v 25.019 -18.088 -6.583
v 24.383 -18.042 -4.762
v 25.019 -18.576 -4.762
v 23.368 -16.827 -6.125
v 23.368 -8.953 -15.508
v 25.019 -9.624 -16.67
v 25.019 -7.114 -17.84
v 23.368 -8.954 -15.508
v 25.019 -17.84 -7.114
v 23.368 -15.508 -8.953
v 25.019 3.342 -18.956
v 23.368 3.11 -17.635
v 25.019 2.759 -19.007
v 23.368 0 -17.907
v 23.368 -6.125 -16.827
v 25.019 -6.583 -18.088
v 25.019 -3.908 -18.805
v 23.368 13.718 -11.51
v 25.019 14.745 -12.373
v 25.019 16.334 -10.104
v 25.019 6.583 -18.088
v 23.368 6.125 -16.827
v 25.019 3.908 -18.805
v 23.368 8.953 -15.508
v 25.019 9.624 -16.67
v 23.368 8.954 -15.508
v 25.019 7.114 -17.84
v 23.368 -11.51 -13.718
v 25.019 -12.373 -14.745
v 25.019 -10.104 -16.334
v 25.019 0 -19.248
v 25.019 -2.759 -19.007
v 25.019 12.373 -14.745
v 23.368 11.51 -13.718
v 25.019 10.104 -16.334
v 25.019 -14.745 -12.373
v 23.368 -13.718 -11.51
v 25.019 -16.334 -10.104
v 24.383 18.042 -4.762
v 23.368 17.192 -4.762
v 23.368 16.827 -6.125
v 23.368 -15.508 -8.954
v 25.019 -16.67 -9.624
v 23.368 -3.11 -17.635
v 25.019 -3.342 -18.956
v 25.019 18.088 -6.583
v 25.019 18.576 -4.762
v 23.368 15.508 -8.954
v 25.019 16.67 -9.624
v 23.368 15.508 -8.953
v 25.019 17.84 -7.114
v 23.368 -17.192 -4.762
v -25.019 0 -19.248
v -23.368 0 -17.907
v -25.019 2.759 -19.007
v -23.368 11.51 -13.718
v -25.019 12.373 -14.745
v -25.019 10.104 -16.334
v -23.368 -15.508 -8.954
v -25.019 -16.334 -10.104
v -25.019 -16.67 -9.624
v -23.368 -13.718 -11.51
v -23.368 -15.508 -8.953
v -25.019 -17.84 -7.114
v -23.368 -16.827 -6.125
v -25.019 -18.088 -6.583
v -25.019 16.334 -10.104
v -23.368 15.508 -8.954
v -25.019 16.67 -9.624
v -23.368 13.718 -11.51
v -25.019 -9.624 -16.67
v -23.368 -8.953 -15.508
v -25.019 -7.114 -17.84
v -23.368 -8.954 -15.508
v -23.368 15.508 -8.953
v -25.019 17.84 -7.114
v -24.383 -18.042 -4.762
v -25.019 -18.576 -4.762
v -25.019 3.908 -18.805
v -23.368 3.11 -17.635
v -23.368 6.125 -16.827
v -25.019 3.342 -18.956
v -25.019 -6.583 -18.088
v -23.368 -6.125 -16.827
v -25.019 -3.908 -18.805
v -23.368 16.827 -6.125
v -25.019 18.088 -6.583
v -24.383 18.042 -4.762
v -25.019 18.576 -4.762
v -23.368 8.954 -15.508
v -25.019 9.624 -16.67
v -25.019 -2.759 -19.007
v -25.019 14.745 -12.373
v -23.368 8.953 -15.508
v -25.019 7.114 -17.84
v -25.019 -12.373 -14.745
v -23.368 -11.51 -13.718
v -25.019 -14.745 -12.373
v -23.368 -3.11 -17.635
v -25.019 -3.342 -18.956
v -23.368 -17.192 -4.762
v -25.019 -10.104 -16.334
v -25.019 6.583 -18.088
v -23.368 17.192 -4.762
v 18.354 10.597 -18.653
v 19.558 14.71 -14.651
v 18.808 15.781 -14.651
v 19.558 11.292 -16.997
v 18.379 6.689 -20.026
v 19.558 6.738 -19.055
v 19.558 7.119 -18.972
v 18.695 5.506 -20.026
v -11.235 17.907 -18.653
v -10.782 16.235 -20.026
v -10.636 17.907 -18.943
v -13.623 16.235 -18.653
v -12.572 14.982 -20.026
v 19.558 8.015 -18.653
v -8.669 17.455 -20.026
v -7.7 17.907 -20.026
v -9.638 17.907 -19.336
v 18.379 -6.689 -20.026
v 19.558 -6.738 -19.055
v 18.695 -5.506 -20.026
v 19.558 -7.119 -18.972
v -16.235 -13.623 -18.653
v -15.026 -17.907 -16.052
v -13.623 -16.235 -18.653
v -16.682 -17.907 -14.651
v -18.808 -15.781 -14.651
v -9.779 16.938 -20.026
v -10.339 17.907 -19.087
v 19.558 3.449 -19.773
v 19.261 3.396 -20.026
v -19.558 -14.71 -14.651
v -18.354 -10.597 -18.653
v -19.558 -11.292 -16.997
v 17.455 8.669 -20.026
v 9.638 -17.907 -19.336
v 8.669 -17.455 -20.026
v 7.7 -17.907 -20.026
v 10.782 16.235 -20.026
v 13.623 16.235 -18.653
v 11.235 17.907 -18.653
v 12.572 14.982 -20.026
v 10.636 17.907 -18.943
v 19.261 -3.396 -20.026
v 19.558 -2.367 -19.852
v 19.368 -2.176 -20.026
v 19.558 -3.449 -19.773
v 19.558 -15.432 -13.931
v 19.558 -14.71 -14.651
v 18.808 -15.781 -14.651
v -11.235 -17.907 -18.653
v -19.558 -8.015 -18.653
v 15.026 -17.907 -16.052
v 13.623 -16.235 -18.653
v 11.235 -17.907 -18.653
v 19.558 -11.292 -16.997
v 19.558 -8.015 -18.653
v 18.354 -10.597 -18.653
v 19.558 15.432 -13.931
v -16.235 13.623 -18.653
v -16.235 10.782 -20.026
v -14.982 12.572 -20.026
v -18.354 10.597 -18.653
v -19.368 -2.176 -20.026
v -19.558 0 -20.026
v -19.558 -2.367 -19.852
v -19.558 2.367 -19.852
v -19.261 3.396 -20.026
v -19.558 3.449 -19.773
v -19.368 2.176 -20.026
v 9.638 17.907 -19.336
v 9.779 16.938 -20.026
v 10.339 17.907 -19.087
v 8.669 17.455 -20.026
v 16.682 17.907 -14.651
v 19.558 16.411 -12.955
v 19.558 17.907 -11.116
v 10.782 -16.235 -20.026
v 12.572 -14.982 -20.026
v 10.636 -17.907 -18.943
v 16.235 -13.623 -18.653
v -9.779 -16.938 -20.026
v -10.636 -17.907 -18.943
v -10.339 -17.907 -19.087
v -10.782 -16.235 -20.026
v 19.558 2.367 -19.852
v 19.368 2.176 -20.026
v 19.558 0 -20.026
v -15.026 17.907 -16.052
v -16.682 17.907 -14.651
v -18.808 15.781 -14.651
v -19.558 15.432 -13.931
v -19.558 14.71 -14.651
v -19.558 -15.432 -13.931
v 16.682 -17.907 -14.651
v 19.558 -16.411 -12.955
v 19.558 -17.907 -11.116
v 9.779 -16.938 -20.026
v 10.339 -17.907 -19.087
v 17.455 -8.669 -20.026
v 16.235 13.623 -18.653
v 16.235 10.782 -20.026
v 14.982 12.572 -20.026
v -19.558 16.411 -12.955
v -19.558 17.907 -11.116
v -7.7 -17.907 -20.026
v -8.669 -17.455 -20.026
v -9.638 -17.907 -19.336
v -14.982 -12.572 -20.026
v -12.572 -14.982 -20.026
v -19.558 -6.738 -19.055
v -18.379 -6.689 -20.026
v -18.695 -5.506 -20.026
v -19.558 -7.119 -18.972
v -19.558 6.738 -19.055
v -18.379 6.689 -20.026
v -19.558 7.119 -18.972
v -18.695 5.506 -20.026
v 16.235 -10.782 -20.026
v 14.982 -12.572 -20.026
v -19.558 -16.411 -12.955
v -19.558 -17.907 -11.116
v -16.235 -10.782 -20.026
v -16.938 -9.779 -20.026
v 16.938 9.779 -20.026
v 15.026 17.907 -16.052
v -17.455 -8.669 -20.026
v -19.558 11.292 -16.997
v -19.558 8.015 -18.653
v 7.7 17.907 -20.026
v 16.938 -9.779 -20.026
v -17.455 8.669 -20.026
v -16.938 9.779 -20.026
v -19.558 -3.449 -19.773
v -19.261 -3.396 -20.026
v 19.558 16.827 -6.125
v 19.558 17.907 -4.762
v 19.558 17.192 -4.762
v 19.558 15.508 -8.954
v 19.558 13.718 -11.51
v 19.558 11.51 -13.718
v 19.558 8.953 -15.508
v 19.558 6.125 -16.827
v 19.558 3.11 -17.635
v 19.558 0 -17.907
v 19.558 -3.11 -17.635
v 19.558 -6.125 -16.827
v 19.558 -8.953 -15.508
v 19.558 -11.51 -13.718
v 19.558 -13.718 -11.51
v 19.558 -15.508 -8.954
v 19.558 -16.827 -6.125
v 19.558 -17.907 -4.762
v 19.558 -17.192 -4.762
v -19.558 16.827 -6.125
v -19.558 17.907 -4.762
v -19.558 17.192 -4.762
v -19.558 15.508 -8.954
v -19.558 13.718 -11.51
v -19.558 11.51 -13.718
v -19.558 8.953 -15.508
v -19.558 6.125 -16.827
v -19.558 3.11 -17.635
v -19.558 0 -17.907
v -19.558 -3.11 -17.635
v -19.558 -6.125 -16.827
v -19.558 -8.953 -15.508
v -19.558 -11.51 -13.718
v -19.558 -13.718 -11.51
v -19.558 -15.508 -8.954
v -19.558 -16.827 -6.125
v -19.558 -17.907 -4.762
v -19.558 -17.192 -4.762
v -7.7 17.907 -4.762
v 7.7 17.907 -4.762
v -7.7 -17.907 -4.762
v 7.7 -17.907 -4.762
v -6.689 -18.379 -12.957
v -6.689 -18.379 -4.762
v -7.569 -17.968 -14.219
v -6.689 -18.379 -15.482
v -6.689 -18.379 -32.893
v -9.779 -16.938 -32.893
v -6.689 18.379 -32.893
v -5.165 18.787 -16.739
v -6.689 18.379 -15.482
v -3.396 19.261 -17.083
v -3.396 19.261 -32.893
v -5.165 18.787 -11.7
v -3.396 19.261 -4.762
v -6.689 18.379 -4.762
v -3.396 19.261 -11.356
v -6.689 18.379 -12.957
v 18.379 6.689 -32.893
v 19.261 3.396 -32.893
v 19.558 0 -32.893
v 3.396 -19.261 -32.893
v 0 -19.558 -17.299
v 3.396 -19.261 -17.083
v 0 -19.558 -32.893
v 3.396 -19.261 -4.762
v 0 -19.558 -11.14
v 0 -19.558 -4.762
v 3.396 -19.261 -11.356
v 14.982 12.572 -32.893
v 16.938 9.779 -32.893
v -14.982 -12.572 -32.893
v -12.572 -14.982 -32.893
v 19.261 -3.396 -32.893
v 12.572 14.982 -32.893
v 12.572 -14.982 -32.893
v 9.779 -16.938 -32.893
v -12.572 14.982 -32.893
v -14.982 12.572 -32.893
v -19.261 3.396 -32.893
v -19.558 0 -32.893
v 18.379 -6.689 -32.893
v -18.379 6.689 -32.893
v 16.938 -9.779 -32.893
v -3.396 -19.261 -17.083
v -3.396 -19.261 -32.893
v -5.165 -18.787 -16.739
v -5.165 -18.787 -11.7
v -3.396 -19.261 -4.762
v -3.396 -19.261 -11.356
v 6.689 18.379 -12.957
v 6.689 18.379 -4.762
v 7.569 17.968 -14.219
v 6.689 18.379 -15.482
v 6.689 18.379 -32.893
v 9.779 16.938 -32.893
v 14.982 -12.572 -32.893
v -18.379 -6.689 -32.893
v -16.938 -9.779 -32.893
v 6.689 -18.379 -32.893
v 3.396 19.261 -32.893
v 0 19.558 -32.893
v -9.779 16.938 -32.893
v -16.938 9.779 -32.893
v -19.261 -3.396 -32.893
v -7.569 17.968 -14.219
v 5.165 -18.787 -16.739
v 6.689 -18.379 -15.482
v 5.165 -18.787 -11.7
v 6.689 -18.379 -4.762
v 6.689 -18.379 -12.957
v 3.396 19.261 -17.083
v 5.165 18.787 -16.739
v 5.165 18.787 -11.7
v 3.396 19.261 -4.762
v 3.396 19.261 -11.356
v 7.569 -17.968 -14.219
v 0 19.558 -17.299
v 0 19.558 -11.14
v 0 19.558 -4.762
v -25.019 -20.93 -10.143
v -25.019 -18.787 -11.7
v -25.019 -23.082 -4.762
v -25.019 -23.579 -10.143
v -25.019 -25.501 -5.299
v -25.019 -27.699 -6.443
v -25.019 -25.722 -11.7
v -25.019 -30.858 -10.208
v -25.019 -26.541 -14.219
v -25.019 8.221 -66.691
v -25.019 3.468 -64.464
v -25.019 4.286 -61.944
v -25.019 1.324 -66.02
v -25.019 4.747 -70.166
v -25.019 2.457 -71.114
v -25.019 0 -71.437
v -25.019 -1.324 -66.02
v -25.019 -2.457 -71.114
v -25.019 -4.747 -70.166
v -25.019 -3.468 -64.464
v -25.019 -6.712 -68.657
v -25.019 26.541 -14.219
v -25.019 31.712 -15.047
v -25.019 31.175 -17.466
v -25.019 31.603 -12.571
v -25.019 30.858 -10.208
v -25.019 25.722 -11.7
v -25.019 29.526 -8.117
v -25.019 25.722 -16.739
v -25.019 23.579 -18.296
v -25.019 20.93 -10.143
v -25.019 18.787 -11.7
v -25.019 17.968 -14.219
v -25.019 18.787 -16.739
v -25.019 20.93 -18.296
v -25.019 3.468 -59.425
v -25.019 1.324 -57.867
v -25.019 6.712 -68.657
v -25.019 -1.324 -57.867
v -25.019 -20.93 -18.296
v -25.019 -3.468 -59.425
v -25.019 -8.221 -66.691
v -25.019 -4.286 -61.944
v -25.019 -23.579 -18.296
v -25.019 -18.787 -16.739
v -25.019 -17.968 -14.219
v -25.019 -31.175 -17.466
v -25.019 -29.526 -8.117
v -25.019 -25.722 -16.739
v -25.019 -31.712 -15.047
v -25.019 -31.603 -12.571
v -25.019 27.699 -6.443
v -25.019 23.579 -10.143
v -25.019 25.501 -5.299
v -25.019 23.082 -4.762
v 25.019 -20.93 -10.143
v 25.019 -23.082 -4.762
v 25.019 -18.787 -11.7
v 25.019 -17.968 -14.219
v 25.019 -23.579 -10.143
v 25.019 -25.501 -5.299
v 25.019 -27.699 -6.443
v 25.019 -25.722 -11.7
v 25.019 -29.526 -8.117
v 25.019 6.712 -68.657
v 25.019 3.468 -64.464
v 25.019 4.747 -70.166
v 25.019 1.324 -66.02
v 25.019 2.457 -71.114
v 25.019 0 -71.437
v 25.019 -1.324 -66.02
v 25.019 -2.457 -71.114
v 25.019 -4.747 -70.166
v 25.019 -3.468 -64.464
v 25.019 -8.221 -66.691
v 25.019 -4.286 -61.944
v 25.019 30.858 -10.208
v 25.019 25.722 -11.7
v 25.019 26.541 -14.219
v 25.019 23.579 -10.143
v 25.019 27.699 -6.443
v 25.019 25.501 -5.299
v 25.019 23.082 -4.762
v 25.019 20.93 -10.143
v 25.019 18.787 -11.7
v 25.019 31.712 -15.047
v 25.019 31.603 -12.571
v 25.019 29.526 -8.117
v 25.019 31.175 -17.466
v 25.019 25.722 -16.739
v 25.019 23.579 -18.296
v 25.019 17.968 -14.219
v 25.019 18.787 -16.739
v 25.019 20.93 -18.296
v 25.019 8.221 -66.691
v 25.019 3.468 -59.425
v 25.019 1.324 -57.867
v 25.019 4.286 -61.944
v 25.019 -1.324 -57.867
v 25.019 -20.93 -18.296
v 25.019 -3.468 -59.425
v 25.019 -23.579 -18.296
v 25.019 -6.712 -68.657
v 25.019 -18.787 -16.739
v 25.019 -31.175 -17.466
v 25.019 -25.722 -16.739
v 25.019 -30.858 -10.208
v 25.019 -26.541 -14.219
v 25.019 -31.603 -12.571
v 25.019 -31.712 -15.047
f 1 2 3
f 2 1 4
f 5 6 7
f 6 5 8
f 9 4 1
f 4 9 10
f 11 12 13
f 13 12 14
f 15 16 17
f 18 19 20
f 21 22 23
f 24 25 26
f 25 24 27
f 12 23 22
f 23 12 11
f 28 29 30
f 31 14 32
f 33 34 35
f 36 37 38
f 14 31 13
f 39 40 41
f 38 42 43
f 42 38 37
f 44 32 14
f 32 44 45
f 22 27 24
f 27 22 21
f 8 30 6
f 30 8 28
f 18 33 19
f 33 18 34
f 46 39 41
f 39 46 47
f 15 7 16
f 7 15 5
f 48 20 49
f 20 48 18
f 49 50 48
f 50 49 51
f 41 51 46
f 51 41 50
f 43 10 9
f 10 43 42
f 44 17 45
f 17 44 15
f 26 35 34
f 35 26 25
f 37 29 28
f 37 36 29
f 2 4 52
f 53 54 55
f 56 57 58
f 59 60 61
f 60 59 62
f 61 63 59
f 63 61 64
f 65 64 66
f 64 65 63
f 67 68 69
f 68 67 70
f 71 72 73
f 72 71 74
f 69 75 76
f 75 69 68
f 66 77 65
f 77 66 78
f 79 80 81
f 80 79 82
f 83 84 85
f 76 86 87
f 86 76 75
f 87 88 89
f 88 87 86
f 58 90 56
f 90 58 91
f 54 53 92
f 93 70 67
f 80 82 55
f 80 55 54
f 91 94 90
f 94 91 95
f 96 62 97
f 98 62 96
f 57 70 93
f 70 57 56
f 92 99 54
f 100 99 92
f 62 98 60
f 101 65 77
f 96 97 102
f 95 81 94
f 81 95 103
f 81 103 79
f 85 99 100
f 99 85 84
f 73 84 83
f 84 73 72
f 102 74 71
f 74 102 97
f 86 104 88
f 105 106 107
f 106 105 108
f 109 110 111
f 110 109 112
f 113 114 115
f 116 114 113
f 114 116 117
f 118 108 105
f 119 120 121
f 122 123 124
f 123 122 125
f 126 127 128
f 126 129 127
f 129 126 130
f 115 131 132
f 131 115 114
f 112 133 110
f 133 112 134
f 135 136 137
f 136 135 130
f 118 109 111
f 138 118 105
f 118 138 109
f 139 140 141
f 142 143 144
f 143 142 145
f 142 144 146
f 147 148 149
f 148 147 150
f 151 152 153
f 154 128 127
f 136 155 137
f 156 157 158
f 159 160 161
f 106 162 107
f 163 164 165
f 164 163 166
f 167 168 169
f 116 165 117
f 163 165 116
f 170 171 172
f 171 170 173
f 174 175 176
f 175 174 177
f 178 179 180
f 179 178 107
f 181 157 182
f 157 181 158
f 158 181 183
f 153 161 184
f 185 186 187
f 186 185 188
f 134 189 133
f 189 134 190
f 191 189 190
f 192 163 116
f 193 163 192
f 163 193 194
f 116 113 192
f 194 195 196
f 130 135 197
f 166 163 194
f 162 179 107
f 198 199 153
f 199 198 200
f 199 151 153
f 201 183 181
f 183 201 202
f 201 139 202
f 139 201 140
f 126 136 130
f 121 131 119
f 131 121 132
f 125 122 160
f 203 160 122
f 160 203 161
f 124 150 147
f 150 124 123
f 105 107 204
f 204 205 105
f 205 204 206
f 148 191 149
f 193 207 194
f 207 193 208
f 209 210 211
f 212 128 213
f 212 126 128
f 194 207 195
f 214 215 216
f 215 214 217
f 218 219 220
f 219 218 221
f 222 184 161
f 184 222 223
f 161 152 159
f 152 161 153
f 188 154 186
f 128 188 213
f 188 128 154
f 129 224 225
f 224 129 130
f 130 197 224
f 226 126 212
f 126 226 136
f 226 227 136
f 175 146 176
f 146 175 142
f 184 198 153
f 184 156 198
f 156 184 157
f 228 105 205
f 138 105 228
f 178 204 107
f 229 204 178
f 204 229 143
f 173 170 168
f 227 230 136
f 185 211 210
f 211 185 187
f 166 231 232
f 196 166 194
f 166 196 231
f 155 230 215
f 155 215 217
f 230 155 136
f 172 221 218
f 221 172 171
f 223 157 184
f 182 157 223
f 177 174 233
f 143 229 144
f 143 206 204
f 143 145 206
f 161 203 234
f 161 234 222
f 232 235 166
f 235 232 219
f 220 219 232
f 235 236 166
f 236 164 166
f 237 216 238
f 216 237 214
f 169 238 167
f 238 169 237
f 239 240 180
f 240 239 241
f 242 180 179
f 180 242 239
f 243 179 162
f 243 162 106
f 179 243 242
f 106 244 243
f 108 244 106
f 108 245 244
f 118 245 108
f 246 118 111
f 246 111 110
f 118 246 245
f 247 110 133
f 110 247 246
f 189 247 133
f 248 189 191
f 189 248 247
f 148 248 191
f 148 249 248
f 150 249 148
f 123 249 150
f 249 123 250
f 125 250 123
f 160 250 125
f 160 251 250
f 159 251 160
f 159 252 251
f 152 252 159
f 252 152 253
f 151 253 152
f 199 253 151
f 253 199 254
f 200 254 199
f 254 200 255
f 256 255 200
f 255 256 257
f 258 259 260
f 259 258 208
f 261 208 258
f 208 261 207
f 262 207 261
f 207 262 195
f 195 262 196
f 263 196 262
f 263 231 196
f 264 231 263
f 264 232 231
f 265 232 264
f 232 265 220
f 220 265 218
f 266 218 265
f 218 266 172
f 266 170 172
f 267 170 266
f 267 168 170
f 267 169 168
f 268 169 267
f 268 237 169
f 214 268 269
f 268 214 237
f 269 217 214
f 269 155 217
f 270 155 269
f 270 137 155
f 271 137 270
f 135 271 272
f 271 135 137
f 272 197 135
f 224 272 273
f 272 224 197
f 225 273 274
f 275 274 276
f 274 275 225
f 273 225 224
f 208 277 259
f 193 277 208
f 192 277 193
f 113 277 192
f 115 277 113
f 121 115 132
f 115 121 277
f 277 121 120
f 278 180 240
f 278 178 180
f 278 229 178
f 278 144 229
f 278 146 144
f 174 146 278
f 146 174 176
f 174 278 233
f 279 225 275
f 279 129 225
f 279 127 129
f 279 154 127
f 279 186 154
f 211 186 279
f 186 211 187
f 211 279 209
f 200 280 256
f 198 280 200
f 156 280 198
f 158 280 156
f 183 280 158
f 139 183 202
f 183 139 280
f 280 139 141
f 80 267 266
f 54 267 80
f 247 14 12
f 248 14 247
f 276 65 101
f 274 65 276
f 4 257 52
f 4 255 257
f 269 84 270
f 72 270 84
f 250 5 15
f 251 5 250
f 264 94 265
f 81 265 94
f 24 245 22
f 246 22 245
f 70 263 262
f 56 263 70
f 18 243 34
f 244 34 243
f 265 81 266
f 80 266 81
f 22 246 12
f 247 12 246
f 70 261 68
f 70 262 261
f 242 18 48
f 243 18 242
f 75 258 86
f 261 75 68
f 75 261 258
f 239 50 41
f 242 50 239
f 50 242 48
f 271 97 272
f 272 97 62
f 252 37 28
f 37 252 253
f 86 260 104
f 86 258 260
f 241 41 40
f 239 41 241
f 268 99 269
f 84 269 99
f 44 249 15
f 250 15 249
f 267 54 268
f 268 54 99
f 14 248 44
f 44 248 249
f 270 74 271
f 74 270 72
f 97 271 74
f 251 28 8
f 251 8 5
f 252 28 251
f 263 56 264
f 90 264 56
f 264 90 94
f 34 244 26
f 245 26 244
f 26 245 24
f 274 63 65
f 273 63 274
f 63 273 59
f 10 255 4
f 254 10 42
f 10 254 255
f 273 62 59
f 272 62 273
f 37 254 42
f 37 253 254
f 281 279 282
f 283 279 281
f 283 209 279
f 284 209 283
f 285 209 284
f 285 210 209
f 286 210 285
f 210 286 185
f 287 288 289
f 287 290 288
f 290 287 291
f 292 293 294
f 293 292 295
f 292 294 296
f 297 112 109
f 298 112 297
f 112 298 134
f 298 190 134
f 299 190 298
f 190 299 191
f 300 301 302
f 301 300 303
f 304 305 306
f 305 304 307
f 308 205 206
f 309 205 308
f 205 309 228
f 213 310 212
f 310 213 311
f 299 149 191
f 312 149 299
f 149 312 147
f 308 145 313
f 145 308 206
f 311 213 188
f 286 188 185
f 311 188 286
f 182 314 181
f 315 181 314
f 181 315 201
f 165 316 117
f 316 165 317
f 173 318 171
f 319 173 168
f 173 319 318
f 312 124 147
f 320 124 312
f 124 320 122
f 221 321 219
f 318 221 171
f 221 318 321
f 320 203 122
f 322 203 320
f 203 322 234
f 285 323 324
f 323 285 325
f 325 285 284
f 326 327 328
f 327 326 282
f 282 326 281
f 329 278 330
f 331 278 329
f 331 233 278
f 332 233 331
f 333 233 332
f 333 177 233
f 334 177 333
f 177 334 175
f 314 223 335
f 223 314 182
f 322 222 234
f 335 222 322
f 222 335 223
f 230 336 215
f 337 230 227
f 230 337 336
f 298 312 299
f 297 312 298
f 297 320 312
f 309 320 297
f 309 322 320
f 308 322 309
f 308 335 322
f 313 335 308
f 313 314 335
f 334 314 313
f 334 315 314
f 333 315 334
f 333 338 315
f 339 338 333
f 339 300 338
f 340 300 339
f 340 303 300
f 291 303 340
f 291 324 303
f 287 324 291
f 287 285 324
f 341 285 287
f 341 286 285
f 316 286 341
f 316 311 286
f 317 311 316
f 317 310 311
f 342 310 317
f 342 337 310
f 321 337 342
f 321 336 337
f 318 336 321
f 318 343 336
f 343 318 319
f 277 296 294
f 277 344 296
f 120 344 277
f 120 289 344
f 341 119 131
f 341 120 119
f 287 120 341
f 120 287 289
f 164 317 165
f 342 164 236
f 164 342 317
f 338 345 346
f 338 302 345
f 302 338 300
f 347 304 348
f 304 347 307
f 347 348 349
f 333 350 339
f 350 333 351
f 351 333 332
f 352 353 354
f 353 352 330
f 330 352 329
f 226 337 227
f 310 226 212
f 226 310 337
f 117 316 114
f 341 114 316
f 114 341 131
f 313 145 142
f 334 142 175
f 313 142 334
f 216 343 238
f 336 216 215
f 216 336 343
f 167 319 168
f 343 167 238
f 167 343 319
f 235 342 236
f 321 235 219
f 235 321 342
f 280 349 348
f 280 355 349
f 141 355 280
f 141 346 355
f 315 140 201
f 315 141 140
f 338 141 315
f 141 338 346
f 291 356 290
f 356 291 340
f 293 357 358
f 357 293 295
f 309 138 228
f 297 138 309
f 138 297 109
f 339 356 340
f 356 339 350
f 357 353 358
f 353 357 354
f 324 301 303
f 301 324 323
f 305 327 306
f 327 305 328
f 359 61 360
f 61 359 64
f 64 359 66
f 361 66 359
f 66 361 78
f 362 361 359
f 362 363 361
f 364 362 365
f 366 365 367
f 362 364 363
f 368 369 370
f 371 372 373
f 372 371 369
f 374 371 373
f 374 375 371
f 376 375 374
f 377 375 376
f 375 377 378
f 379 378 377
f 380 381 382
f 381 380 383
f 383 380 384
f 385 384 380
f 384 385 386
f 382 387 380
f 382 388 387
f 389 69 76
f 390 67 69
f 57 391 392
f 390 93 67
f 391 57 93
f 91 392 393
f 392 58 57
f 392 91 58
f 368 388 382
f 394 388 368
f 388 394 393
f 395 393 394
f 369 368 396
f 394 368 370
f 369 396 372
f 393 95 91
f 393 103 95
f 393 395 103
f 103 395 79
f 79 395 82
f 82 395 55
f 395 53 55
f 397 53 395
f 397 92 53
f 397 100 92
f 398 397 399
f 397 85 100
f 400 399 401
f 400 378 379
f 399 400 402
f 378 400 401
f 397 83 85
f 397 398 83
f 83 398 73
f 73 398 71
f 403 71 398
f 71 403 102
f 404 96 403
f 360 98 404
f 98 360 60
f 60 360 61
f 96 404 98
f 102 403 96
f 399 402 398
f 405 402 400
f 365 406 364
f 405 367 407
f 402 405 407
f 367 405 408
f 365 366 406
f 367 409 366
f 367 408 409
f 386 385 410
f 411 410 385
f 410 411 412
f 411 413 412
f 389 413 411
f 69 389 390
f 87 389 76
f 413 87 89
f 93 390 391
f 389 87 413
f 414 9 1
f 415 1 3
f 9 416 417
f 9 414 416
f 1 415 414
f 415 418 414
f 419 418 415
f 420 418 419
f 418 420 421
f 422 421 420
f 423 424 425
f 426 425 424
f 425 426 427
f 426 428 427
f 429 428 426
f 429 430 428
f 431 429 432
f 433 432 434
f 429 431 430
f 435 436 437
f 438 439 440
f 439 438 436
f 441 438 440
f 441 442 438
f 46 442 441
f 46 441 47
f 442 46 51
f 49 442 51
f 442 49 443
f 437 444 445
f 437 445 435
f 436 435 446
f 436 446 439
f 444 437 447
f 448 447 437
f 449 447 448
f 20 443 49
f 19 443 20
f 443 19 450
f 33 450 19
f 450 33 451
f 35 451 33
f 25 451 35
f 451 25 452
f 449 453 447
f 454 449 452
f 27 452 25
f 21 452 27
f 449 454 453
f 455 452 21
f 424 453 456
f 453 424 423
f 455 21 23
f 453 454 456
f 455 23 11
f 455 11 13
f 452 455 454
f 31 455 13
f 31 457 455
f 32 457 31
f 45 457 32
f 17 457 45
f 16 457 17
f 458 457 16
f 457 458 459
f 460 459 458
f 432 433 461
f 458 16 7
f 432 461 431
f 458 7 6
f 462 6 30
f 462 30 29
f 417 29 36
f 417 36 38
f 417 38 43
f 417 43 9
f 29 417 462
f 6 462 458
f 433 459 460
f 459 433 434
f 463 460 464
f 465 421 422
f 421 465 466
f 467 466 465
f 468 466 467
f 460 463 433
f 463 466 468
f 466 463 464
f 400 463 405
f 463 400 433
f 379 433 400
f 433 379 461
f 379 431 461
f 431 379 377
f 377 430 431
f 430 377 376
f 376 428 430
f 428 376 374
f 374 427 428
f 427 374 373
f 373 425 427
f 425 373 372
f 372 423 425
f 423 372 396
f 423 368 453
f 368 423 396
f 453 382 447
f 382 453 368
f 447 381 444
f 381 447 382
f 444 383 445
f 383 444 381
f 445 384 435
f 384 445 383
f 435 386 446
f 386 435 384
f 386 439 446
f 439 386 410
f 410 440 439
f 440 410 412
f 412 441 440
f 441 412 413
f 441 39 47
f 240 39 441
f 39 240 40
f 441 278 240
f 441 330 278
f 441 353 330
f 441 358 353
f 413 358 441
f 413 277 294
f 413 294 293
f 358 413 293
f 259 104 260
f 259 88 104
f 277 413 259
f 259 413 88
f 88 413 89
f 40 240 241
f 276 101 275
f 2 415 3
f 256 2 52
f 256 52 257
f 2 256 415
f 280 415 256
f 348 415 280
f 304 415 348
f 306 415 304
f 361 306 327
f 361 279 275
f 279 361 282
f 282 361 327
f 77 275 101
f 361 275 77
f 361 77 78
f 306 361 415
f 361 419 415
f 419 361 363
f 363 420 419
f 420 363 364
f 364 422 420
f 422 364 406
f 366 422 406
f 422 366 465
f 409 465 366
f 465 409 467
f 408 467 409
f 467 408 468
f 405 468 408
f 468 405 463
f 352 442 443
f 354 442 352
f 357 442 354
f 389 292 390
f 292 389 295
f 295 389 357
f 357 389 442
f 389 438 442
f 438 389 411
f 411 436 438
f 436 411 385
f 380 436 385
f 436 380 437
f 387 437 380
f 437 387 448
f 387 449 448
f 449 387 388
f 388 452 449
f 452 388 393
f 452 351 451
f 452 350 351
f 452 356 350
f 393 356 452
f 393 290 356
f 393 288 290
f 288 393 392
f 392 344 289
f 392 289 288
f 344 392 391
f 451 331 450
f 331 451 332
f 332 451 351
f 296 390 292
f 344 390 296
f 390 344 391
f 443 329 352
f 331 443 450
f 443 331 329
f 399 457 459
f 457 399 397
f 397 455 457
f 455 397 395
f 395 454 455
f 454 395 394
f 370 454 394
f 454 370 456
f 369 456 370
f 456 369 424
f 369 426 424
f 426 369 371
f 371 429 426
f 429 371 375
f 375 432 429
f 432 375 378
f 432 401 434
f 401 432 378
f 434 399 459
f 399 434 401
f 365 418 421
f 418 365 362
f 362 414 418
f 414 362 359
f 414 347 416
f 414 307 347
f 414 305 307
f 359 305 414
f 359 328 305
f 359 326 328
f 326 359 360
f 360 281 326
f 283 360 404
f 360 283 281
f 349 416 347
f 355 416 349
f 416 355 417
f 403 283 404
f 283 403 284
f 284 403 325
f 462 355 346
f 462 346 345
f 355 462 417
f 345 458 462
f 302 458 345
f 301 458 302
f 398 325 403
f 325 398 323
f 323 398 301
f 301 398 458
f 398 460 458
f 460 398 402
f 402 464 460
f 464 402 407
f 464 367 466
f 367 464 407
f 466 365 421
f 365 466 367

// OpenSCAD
// file: Vitamins/Angle Stock.scad
AngleStockWidth                   = 1;
AngleStockThickness               = 2;
AngleStockTrough                  = 3; // Thickness across the "elbow" of the angle
AngleStockWidthClearanceSnug      = 4;
AngleStockWidthClearanceLoose     = 5;
AngleStockThicknessClearanceSnug  = 6;
AngleStockThicknessClearanceLoose = 7;
AngleStockHeight                  = 8;

// .747
// .744
// .745
//.740


//.749
//.75
AngleStockThreeQuartersByOneEighthInch = [
  [AngleStockWidth,                   0.771],
  [AngleStockThickness,               0.13],
  [AngleStockTrough,                  0.235],
  [AngleStockWidthClearanceSnug,      0.008],
  [AngleStockWidthClearanceLoose,     0.015],
  [AngleStockThicknessClearanceSnug,  0.007],
  [AngleStockThicknessClearanceLoose, 0.008],
  [AngleStockHeight,                  0.574]
];

3_4_angle_stock_width                     = 3/4;
3_4_angle_stock_thickness                 = 0.13;
3_4_angle_stock_trough                    = 0.235;
3_4_angle_stock_height                    = 0.574;
3_4_angle_stock_width_clearance           = 0.008;
3_4_angle_stock_width_clearance_loose     = 0.008;
3_4_angle_stock_thickness_clearance       = 0.005;
3_4_angle_stock_thickness_clearance_loose = 0.007;

// trough is a percentage: 0.0-1.0
module AngleStock(stock=AngleStockThreeQuartersByOneEighthInch, trough=.5, thicknessClearance=AngleStockThicknessClearanceLoose, widthClearance=AngleStockWidthClearanceLoose, length=1) {

  // A percentage of the inner-side length (width - thickness)
  clearThicknessOffset = thicknessClearance != undef ? lookup(thicknessClearance, stock) : 0;
  clearWidthOffset     = widthClearance     != undef ? lookup(widthClearance, stock)     : 0;
  troughOffset         = (trough * (lookup(AngleStockWidth, stock) - lookup(AngleStockThickness, stock))) + lookup(AngleStockThickness, stock);

  linear_extrude(height=length)
  polygon(points=[[0,0],
                  [lookup(AngleStockWidth, stock)+clearWidthOffset,0],                                                         // X-POS Outer Corner
                  [lookup(AngleStockWidth, stock)+clearWidthOffset,lookup(AngleStockThickness, stock)+clearThicknessOffset],   // X-POS Inner Corner
                  [troughOffset,lookup(AngleStockThickness, stock)+clearThicknessOffset],                                      // X-POS Trough
                  [lookup(AngleStockThickness, stock)+clearThicknessOffset,troughOffset],                                      // Y-POS Trough
                  [lookup(AngleStockThickness, stock)+clearThicknessOffset,lookup(AngleStockWidth, stock)+clearWidthOffset],   // Y-POS Inner Corner
                  [0,lookup(AngleStockWidth, stock)+clearWidthOffset],                                                         // Y-POS Outer Corner
          ],
          paths=[[0,1,2,3,4,5,6]]);
}


//#AngleStock();

module 3_4_angle_stock(length=1, cutter=false, loose=false) {
  width_clearance     = loose ? 3_4_angle_stock_width_clearance_loose     : 3_4_angle_stock_width_clearance;
  thickness_clearance = loose ? 3_4_angle_stock_thickness_clearance_loose : 3_4_angle_stock_thickness_clearance;

  union() {
    if (cutter) {
      translate([-width_clearance,-thickness_clearance,0])
      cube([3_4_angle_stock_width     + width_clearance*2,
            3_4_angle_stock_thickness + thickness_clearance*2,
            length]);

      translate([-width_clearance,-thickness_clearance,0])
      cube([3_4_angle_stock_thickness + thickness_clearance*2,
            3_4_angle_stock_width     + width_clearance*2,
            length]);

      translate([3_4_angle_stock_thickness/2, 3_4_angle_stock_thickness/2, 0])
      difference() {
        cube([3_4_angle_stock_trough + thickness_clearance/2,
              3_4_angle_stock_trough + thickness_clearance/2,
              length]);

        translate([3_4_angle_stock_trough + thickness_clearance/2,
                   thickness_clearance/2,
                   -0.1])
        rotate([0,0,45])
        cube([3_4_angle_stock_trough*sqrt(2),
              3_4_angle_stock_trough*sqrt(2),
              length + 0.2]);
      }

    } else {
      cube([3_4_angle_stock_width,3_4_angle_stock_thickness,length]);
      cube([3_4_angle_stock_thickness,3_4_angle_stock_width,length]);

      translate([3_4_angle_stock_thickness, 3_4_angle_stock_thickness, 0])
      difference() {
        cube([3_4_angle_stock_trough, 3_4_angle_stock_trough,length]);

        translate([3_4_angle_stock_trough,0,-0.1])
        rotate([0,0,45])
        cube([3_4_angle_stock_trough*sqrt(2), 3_4_angle_stock_trough*sqrt(2),length + 0.2]);
      }
    }
  };
}
// file: Math/Triangles.scad
// Pythagorean Theorem
function pyth_A_B(a,b) = sqrt(pow(a, 2) + pow(b, 2));
function pyth_A_C(a,c) = sqrt(pow(c, 2) - pow(a, 2));
function pyth_B_C(b,c) = sqrt(pow(c, 2) - pow(b, 2));

// Heron's Formula for Triangle Area
function heron_triangle_area(a,b,c) = sqrt(
    ((a+b+c)/2)
    * (((a+b+c)/2) - a)
    * (((a+b+c)/2) - b)
    * (((a+b+c)/2) - c)
  );

function heron_triangle_height(a,b,c) = 2 * heron_triangle_area(a,b,c) / c;
// file: Firing Pin Guide.scad
include <Components.scad>;
use <Vitamins/Pipe.scad>;
use <Vitamins/Rod.scad>


// Firing Pin Extension
module firing_pin_guide(firingPinRod=RodOneEighthInch,
                        height=7/16, od=TeeInnerDiameter(receiverTee),
                        $fn=50) {
  color("Orange")
  render()
  difference() {
    union() {
      cylinder(r=od/2, h=height);
    }

    // Tapered Entrance
    translate([0,0,height/3*2])
    cylinder(r1=lookup(RodRadius, RodOneEighthInch), r2=1/4, h=height/3);

    // Firing Pin Hole
    translate([0,0,-0.1])
    Rod(rod=firingPinRod, clearance=RodClearanceLoose, length=height+0.2, $fn=50);
  }
}


scale([25.4, 25.4, 25.4])
firing_pin_guide();
// file: Striker.scad
use <Vitamins/Pipe.scad>;
use <Vitamins/Rod.scad>;

module striker(length=4, od=0.75, id=0.53,
               firingPin = Spec_RodOneEighthInch(),
               linePin = Spec_RodOneEighthInch(),
               depth=0.8,
               rope_width = 1/8, rope_depth=1/4, $fn=30) {

  difference() {

    // Body
    cylinder(r=od/2, h=length);

    // Weight Hole
    translate([0,0,depth])
    cylinder(r=id/2, h=length);

    // Line Pin Hole
    translate([0,od/2 + 0.1,length - RodDiameter(firingPin)*2])
    rotate([90,0,0])
    Rod(rod=firingPin, length=od+0.2);

    // Firing Pin Hole
    translate([0,0,-0.1])
    Rod(rod=firingPin, length=length);

    // Firing Pin
    translate([0,0,-1])
    %Rod(rod=firingPin, length=1+depth);
    
    // Line Pin
    translate([0,od/2 + 0.025,length - RodDiameter(firingPin)*2])
    rotate([90,0,0])
    Rod(rod=firingPin, length=od + 0.05);
    
    // Line
    cylinder(r=rope_width/2, h=12);
  }
}

translate([0,50,0])
scale([25.4, 25.4, 25.4])
striker();
// file: Components/Semicircle.scad
module semicircle(od=3/4, angle=225, $fn=50) {
  rotate([0,0,-(angle % 90)])
  difference() {
    union() {
      intersection() {

        // Main Body
        circle(r=od/2);

        // 90* Angle cutters
        if (angle < 360)
        for (i=[0: (angle / 90)]) {

          // First angle, angle mod 90
          if (i == 0)
          polygon(points=[[0,0],
                          [od,0],
                          [cos(angle%90) * od, sin(angle%90) * od]]);

          // 90* sections
          if (i>0)
          rotate([0,0,-90*i])
          square([od, od]);
        }
        
      }
    }
  }
}

scale([25.4, 25.4, 25.4])
semicircle();
// file: Components.scad
include <Math/Triangles.scad>;
include <Vitamins/Angle Stock.scad>;
include <Vitamins/Pipe.scad>;
include <Vitamins/Rod.scad>;

//
// Component Dimensions
//
$fn=60;

// Fascist Settings
overall_length = 26.5;
barrel_length = 18.5;

// Configurable: Wall Thickness
tee_overlap             = 3/16;

rope_od                 = 6/32;

// Configurable: Cylinder
cylinder_spindle_diameter    = 1/8;
cylinder_spindle_wall        = 5/16;
revolver_cylinder_wall       = PipeWall(PipeOneInch);
revolver_cylinder_outer_wall = 3/64;
spindle_overlap              = revolver_cylinder_wall;
revolver_zigzag_pin_diameter = 4/32;
revolver_zigzag_depth        = 3/16;
revolver_shots               = 6;
zigzag_clearance             = 1/64;
chamber_length               = 3;
chamber_seal_overlap         = 1/4;
spindle_collar_diameter      = 0.505;
spindle_collar_height        = 0.27;
actuator_cylinder_clearance  = 0.1;

// Configurable: Vitamin Selection
railRod        = RodFiveSixteenthInch;
breechBushing  = BushingThreeQuarterInch;
barrelPipe     = TubingOnePointOneTwoFive;
stockPipe      = PipeThreeQuarterInch;
receiverTee    = TeeThreeQuarterInch;
gasSealingPipe = PipeOneInch;

// Configurable: Common Settings
bottomRailAngle = 50;

// Configurable: Forend
forend_length = 2;
forend_wall_thickness = 3/16;

// AR15 grip info
grip_width                 = 0.85;
grip_height                = 1.27;


// Calculated: Revolver Cylinder
zigzag_width = revolver_zigzag_pin_diameter + zigzag_clearance*2;
revolver_cylinder_radius = (PipeOuterDiameter(PipeThreeQuarterInch)*1.5)+revolver_cylinder_wall + revolver_cylinder_outer_wall + revolver_zigzag_depth;
revolver_cylinder_od   = revolver_cylinder_radius*2;
cylinder_circumference = 3.14 * pow(revolver_cylinder_od/2, 2);
revolver_center_offset = PipeOuterDiameter(PipeThreeQuarterInch) + revolver_cylinder_wall;
rotation_angle = 360/revolver_shots;
rotation_arc = cylinder_circumference/revolver_shots;
zigzag_height = rotation_arc/2 + revolver_zigzag_pin_diameter*2;
revolver_cylinder_height = zigzag_height + revolver_zigzag_pin_diameter*2.5;
chamber_protrusion = (chamber_length - revolver_cylinder_height)/2;

top_slot_height = revolver_zigzag_pin_diameter*2;
bottom_slot_height = revolver_zigzag_pin_diameter*2 + zigzag_clearance*1.5;
// file: Reference.scad
use <Vitamins/Pipe.scad>;
use <Vitamins/Rod.scad>;
use <Vitamins/Grip.scad>;

module Reference_Barrel(receiver, breech, barrel, barrelLength) {
  translate([(TeeWidth(receiver)/2) + BushingHeight(breech) - BushingDepth(breech),0,0])
  rotate([0,90,0])
  Pipe(barrel, length=barrelLength);

}

module Reference_Receiver(receiver) {
  translate([0,0,-TeeCenter(receiver)])
  Tee(receiver);
}

module Reference_Stock(receiver, stock, stockLength) {
  translate([-(TeeWidth(receiver)/2) +0.01,0,0])
  rotate([0,-90,0])
  Pipe(stock, length=stockLength+0.02);
}

module Reference_Butt(receiver, stockLength) {
  translate([-stockLength,0,0])
  rotate([0,-90,0])
  Tee(receiver);
}

module Reference_Grip_Position(receiver) {
  translate([-(TeeWidth(receiver)/2)+TeeRimWidth(receiver) + 0.03,0,-TeeCenter(receiver) +TeeRimWidth(receiver) + 0.07])
  children();
}

// TODO
module Reference_Grip(receiver) {
  Reference_Grip_Position(receiver)
  Grip_Bolt();
}

// TODO
module Reference_Forend() {
}

module Reference_Breech(receiver, breech) {
  translate([(TeeWidth(receiver)/2) + BushingHeight(breech) - BushingDepth(breech),0,0])
  rotate([0,-90,0])
  Bushing(spec=breech);
}

module Reference(barrel=Spec_TubingOnePointOneTwoFive(), barrelLength=18,
                 breech=Spec_BushingThreeQuarterInch(),
                 receiver=Spec_TeeThreeQuarterInch(),
                 stock=Spec_PipeThreeQuarterInch(), stockLength=12,
                 butt=Spec_TeeThreeQuarterInch(),
                 forend=Spec_RodFiveSixteenthInch()) {

  Reference_Receiver(receiver);
  Reference_Breech(receiver, breech);
  Reference_Butt(receiver, stockLength);
  Reference_Stock(receiver, stock, stockLength);
  Reference_Barrel(receiver, breech, barrel, barrelLength);
  Reference_Forend(forend);
  Reference_Grip(receiver);
}

scale([25.4, 25.4, 25.4])
Reference();



//module Base(receiverTee=TeeThreeQuarterInch) {
//
//  tee_housing_reference(debug=true);
//
//  color("Red")
//  render()
//  translate([-1/4,-1/8,-1/16])
//  rotate([0,90,90])
//  trigger();
//
//  color("Gold")
//  translate([0,0,TeeCenter(receiverTee)])
//  rotate([0,-90,0])
//  striker();
//
//  color("HotPink")
//  translate([(TeeWidth(receiverTee)/2) - BushingDepth(breechBushing),0,TeeCenter(receiverTee)])
//  rotate([0,-90,0])
//  firing_pin_guide();
//
//  color("Green")
//  translate([-9.4,0,TeeCenter(receiverTee)])
//  rotate([0,-90,0])
//  stock_spacer(length=3.5);
//
//  translate([-4,0,TeeCenter(receiverTee)])
//  rotate([0,-90,0])
//  SpringCartridge(debug=true);
//
//  translate([-4-3,0,TeeCenter(receiverTee)])
//  rotate([0,-90,0])
//  SpringCartridge(debug=true);
//
//  color("CornflowerBlue")
//  translate([-TeeWidth(receiverTee)/2 -12,0,-1/8])
//  StrikerGuide();
//
//  // Stock
//  union() {
//
//    // Tee
//    translate([-12,0,TeeCenter(receiverTee)])
//    rotate([0,-90,0])
//    %Tee(receiverTee);
//
//    translate([(TeeWidth(receiverTee)/2) + lookup(BushingHeight, breechBushing) - lookup(BushingDepth, breechBushing),0,TeeCenter(receiverTee)])
//    rotate([0,-90,0])
//    %Bushing(spec=breechBushing);
//
//    // Stock Pipe
//    translate([-TeeWidth(receiverTee)/2,0,TeeCenter(receiverTee)])
//    rotate([0,-90,0])
//    %Pipe(stockPipe, length=12);
//  }
//}
//
//
//module Single() {
//  Base();
//
//  color("Purple")
//  translate([2,0,TeeCenter(receiverTee)])
//  rotate([0,-90,180])
//  forend_single(length=6);
//}
//
//
//module Revolver() {
//  Base();
//
//  translate([TeeWidth(receiverTee)/2 +BushingHeight(breechBushing) - BushingDepth(breechBushing)+1/8,0,1/8])
//  rotate([0,90,0]) {
//    revolver_cylinder(debug=true);
//
//    color("Red")
//    for (i=[0:6-1])
//    rotate([0,0,360/6*i])
//    translate([PipeOuterDiameter(PipeThreeQuarterInch) + revolver_cylinder_wall, 0,-1/8])
//    ShellSlug();
//  }
//
//  color("Purple")
//  render()
//  translate([6.15+1/8,0,TeeCenter(receiverTee)])
//  rotate([0,-90,0])
//  forend();
//}
//
////rotate([0,0,360*$t])
//scale([25.4, 25.4, 25.4]) {
//  Single();
//  //Revolver();
//}
// file: Trigger.scad
$t=0;
//$t=1;
include <Components.scad>;
use <Components/Semicircle.scad>;
use <Vitamins/Rod.scad>;
use <Vitamins/Pipe.scad>;
use <Striker.scad>;
use <Firing Pin Guide.scad>;

$fn=50;

function sear_height() = 1/4;

slot_width = 0.27;

searPin = RodOneEighthInch;
sear_arc_angle = 40;
sear_height = sear_height();
sear_major_od = 53/64;
sear_minor_od = 0.52; //0.372;
sear_interface_extension = 0.414;


triggerPin = RodOneEighthInch;
trigger_offset = 18/32; // 19/32; // Offset from center_z
trigger_backset = TeeInnerDiameter(receiverTee)/2  -3/16;
trigger_height = 1/4;
trigger_body_od = 1.17;
trigger_major_od = .88;
trigger_arc_angle = 24.5;



interface_clearance=0.005;

module sear(pin=RodOneEighthInch, pin_clearance=RodClearanceLoose, od=sear_major_od, height=sear_height, center=false, angle=230) {

  $fn=30;

  color("Red")
  translate([0,0,center ? -height/2 : 0])
  difference() {

    render(convexity=2)
    linear_extrude(height=height)
    difference() {
      union() {
        // Spindle
        circle(r=sear_minor_od/2);

        // Body Infill + Front and Back Engagement Surfaces
        rotate([0,0,160])
        semicircle(od=sear_interface_extension*2, angle=15);

        // Overtravel Stop
        rotate([0,0,30])
        mirror([0,1])
        square([.5,0.26]);

        // Striker Engagement extension
        translate([-1/32,0,0])
        mirror([1,0,0])
        square([0.38, sear_minor_od]);
      }

      // Clear the striker when engaged
      translate([-trigger_offset +3/4/2,(sear_minor_od/2)*1.3,0])
      rotate([0,0,180])
      semicircle(od=1, angle=130);

      // Clear the striker when disengaged
      //-od-sear_minor_od/2
      translate([0,-sear_minor_od/2,0])
      rotate([0,0,180+sear_arc_angle])
      translate([0,-od,0])
      square([od, od*2]);

      // Overtravel Trigger Clearance
      translate([-trigger_offset + TeeCenter(receiverTee) + 1/16,trigger_backset])
      circle(r=trigger_major_od/2 + interface_clearance);

    }

    // Pin Hole
    translate([0,0,-0.1])
    Rod(rod=pin, clearance=pin_clearance, length=height + 0.2);
  }
}

module trigger(pin=RodOneEighthInch, pin_clearance=RodClearanceLoose, minor_od=.34, id=7/8, height=trigger_height, center=false, angle=196) {

  od=3/4;

  color("Gold")
  translate([0,0,center ? -height/2 : 0])
  difference() {
    render(convexity=2)
    linear_extrude(height=height)
    union() {

      // Sear Interface
      translate([0,-0.05,0])
      mirror([1,0,0])
      square([trigger_body_od/2,minor_od/2 + 0.05]);

      // Spindle Body
      circle(r=minor_od/2);

      // Trigger Bar Infill
      rotate([0,0,-45])
      semicircle(od=trigger_major_od, angle=135);


      // Trigger (UI)
      rotate([0,0,-25])
      //translate([-0.1,-0.13,0])
      difference() {
        intersection() {

          // Trigger body
          translate([0,0.18,0])
          mirror([0,1])
          square([1.5,0.6]);

          // Trigger Back Curve
          translate([od/2 * sqrt(2) + 0.09,-od/2 * sqrt(2)-0.15])
          circle(r=1.05);
        }

        // Trigger Front Curve
        translate([.78,-0.5,-0.1])
        translate([TeeRimWidth(receiverTee),0,0])
        circle(r=0.45);
      }
    }

    // Spindle Hole
    translate([0,0,-0.1])
    Rod(rod=pin, clearance=pin_clearance, length=height + 0.2);

  }
}

module trigger_insert(pin=RodOneEighthInch,
                      column_height=0.94,
                      half=false,
                      debug=false) {

  if (debug) {
    *%Tee(TeeThreeQuarterInch);

    // Striker
    //translate([-(0.5*$t),0,0])
    //translate([-(0.5),0,0])
    translate([(sear_minor_od/2) * 1.75,0,TeeCenter(receiverTee)])
    rotate([0,90,0])
    striker();

    translate([0,0,TeeCenter(receiverTee)])
    translate([0,0,-trigger_offset])
    rotate([0,$t*sear_arc_angle,])
    //rotate([0,sear_arc_angle,0])
    rotate([90,90,0])
    sear(center=true);

    translate([trigger_backset,0, -1/16])
    rotate([90,90,0])
    rotate([0,0,trigger_arc_angle*$t])
    //rotate([0,0,trigger_arc_angle])
    trigger(center=true);
  }

  difference() {
    union() {

      // Insert body
      cylinder(r=TeeInnerDiameter(receiverTee)/2, h=column_height, $fn=50);

      // Foot
      translate([-TeeInnerRadius(receiverTee)+0.01,
                 -TeeInnerRadius(receiverTee),
                 -5/16])
      intersection() {

        // ID-sized cube
        translate([0,0,-1/16])
        cube([TeeInnerDiameter(receiverTee)+(1/8)-0.02,
              TeeInnerDiameter(receiverTee),
              3/8]);

        // Taper the side
        translate([0.5,TeeInnerRadius(receiverTee),4/16])
        rotate([45,0,0])
        cube([1.2,1,1], center=true);


        // Taper front and back
        translate([0.5,0.5,13/64])
        rotate([0,45,0])
        cube([1,
              1,
              1], center=true);
      }

      // Support Tabs
      translate([0,0,-TeeRimWidth(receiverTee)+1/8])
      intersection() {
        translate([-TeeRimRadius(receiverTee)-1/8,-TeeInnerRadius(receiverTee),0])
        cube([TeeRimDiameter(receiverTee), TeeInnerDiameter(receiverTee), 3/16]);

        // Rim-wide
        TeeRim(receiverTee, height=1/4, clearance=-0.015);
        
        // Taper the rim
        translate([0,0,-0.001])
        cylinder(r1=TeeRimRadius(receiverTee)*0.9, r2=TeeRimRadius(receiverTee)*1.5, h=1/4);

        // Taper to help insertion
        translate([-TeeRimRadius(receiverTee),0,-0.4])
        rotate([45,0,0])
        cube([TeeRimDiameter(receiverTee), 2, 2]);
      }
    }

    // Central Slot
    if (!half)
    translate([-TeeRimDiameter(receiverTee)/2 - 0.1,-slot_width/2,-TeeRimWidth(receiverTee)-0.1])
    cube([TeeRimDiameter(receiverTee) +(1/8)+0.2, slot_width, column_height + 1]);

    // Sear Pin
    translate([0,0,TeeCenter(receiverTee) - trigger_offset])
    rotate([90,0,0])
    Rod(rod=pin, clearance=RodClearanceSnug, length=TeeRimDiameter(receiverTee), center=true);

    // Trigger Pin
    translate([trigger_backset,0,-RodRadius(pin)])
    rotate([90,0,0])
    Rod(rod=pin, clearance=RodClearanceSnug, length=TeeRimDiameter(receiverTee), center=true);

    // Cut at slot for printing
    if (half)
    mirror([0,1,0])
    translate([-(TeeRimDiameter(receiverTee)/2) - 0.1,-slot_width/2,-1/2])
    cube([TeeRimDiameter(receiverTee)+0.2, slot_width + 1, column_height + 0.7]);
  }
}


*!scale([25.4, 25.4, 25.4])
trigger_insert(debug=true);

module trigger_insert_2d(receiverTee=TeeThreeQuarterInch, slot_width=0.254,
                         sideClearance=0, rimClearance=-0.01, $fn=60) {
  intersection() {
    translate([-TeeRimRadius(receiverTee),-TeeInnerRadius(receiverTee)])
    square([TeeRimDiameter(receiverTee) - 1/8, TeeInnerDiameter(receiverTee)]);
    
    difference() {
      circle(r=TeeRimRadius(receiverTee) + rimClearance, $fn=$fn);

      // Center Tabs
      for (i = [0,180])
      rotate([0,0,i])
      translate([TeeInnerRadius(receiverTee),-slot_width/2])
      square([TeeRimRadius(receiverTee), slot_width]);
    }

  }
}

*!scale([25.4, 25.4, 25.4])
trigger_insert_2d();


module trigger_plater() {
  scale([25.4, 25.4, 25.4]) {

    translate([0,1,-slot_width/2])
    rotate([90,0,180])
    trigger_insert(debug=false, half=true);

    translate([0,-1,-slot_width/2])
    mirror([1,0,0])
    rotate([90,0,0])
    trigger_insert(debug=false, half=true);

    translate([1,-0.4,0])
    rotate([0,0,110])
    trigger();

    translate([-1,0,0])
    rotate([0,0,140])
    sear();
  }
}

trigger_plater();
// file: Forend Rail.scad
use <Vitamins/Pipe.scad>;
use <Vitamins/Rod.scad>;

FOREND_RAIL_WALL_DEFAULT = 3/16;
function ForendRailWall() = FOREND_RAIL_WALL_DEFAULT;
function ForendRodAngles(receiver, rod, wall) = [180, 50, -50];
function ForendRailOffset(receiver, rod, wall) = TeeRimRadius(receiver) + wall + RodRadius(rod);

module ForendRods(receiver=Spec_TeeThreeQuarterInch(),
                  rod=Spec_RodFiveSixteenthInch(),
                  wall=ForendRailWall(),
                  clearance=RodClearanceSnug(), angles=ForendRodAngles(), rodFnAngle=90) {

  // Rods
  for (angle = angles)
  rotate([0,0,angle])
  translate([-ForendRailOffset(receiver, rod, wall), 0])
  rotate([0,0,-angle+rodFnAngle])
  Rod2d(rod=rod, clearance=clearance);

  // Debugging aid
  //%TeeRim(receiver);

}

module ForendRail(receiver=Spec_TeeThreeQuarterInch(),
                  barrel=Spec_PipeThreeQuarterInch(),
                  rod=Spec_RodFiveSixteenthInch(),
                  rodHoles=true,
                  wall=ForendRailWall(),
                  clearance=RodClearanceLoose(),
                  angles=ForendRodAngles()) {

  // Rail body
  difference() {
    hull()
    union() {
      for (angle = angles)
      rotate([0,0,angle])
      translate([-ForendRailOffset(receiver, rod, wall), 0])
      circle(r=RodRadius(rod) + wall, $fn=24);
    }

    if (rodHoles)
    ForendRods(receiver, rod, wall, clearance, angles);
  }
}

render(convexity=2)
linear_extrude(height=1)
ForendRail();
// file: Vitamins/Rod.scad
RodDiameter       = 1;
RodRadius         = 2;
RodClearanceSnug  = 3;
RodClearanceLoose = 4;
RodFn             = 5;

function RodClearanceSnug()  = RodClearanceSnug;
function RodClearanceLoose() = RodClearanceLoose;

RodOneEighthInch = [
  [RodDiameter, 1/8],
  [RodRadius, 1/8/2],
  [RodClearanceSnug, 0.02],
  [RodClearanceLoose, 0.03],
  [RodFn, 8]
];
function Spec_RodOneEighthInch() = RodOneEighthInch;

RodOneQuarterInch = [
  [RodDiameter,       1/4],
  [RodRadius,         1/4/2],
  [RodClearanceSnug,  0.027],
  [RodClearanceLoose, 0.035],
  [RodFn,             8]
];
function Spec_RodOneQuarterInch() = RodOneQuarterInch;

RodFiveSixteenthInch = [
  [RodDiameter,       5/16],
  [RodRadius,         5/16/2],
  [RodClearanceSnug,  0.025],
  [RodClearanceLoose, 0.025],
  [RodFn,             10]
];
function Spec_RodFiveSixteenthInch() = RodFiveSixteenthInch;

RodThreeQuarterInchTubing = [
  [RodDiameter,       0.758],
  [RodRadius,         0.758/2],
  [RodClearanceSnug,  0.023],
  [RodClearanceLoose, 0.029],
  [RodFn,             30]
];
function Spec_RodThreeQuarterInchTubing() = RodThreeQuarterInchTubing;

/**
 * Lookup the diameter of a rod.
 * @param rod The rod to lookup.
 * @param clearance The RodClearance to use.
 */
function RodDiameter(rod=undef, clearance=undef)
           = lookup(RodDiameter, rod)
          + (clearance != undef ? lookup(clearance, rod) : 0);

/**
 * Lookup the radius of a rod.
 * @param rod The rod to lookup.
 * @param clearance The RodClearance to use.
 */
function RodRadius(rod, clearance=undef) = RodDiameter(rod, clearance)/2;

/**
 * Lookup the $fn value for a rod, optionally overriding it
 * @param rod The rod to lookup.
 * @param $fn Override the RodFn. If defined, this will be the result. (convenience arg)
 **/
function RodFn(rod, $fn=undef) = ($fn == undef) ? lookup(RodFn, rod) : $fn;

/**
 * A 2D rod (circle).
 * @param rod The rod to render.
 * @param clearance The RodClearance to use.
 * @param $fn Override the RodFn value of the rod.
 */
module Rod2d(rod=RodOneQuarterInch, clearance=undef, $fn=undef) {
  circle(r=RodRadius(rod, clearance),
         $fn=RodFn(rod, $fn));
}


module Rod(rod=RodOneQuarterInch, length=1, clearance=undef, center=false, $fn=undef) {
  render(convexity=1)
  linear_extrude(height=length, center=center)
  Rod2d(rod, clearance, $fn=$fn);
}

// 1/8" Rod
1_8_rod_d                = 1/8;
1_8_rod_r                = 1_8_rod_d/2;
1_8_rod_clearance        = 0.02;
1_8_rod_clearance_loose  = 0.03;

// 1/4" Rod
1_4_rod_d                = 1/4;
1_4_rod_r                = 1_4_rod_d/2;
1_4_rod_clearance        = 0.01;
1_4_rod_clearance_loose  = 0.015;
1_4_rod_collar_d         = 1/22;
1_4_rod_collar_width     = 0.27;
1_4_rod_collar_clearance = 0.0; // TODO

// 5/16" Rod
5_16_rod_d                = 5/16;
5_16_rod_r                = 5_16_rod_d/2;
5_16_rod_clearance        = 0.02; // TODO
5_16_rod_clearance_loose  = 0.02;

module rod(diameter=1, length=1, clearance=0, clearance_loose=0, loose=false, cutter=false, center=false, $fn=20) {
  clearance = loose ? clearance_loose : clearance;

  if (cutter) {
    cylinder(r=(diameter/2) + (loose ? clearance_loose : clearance), h=length, center=center);
  } else {
    cylinder(r=diameter/2, h=length, center=center);
  }
}

module 1_8_rod(length=1, loose=false, cutter=false, center=false) {
  rod(diameter=1_8_rod_d,
      clearance=1_8_rod_clearance,
      clearance_loose=1_8_rod_clearance_loose,
      length=length,
      cutter=cutter,
      center=center);
}

module 1_4_rod(length=1, loose=false, cutter=false, center=false) {
  rod(diameter=1_4_rod_d,
      clearance=1_4_rod_clearance,
      clearance_loose=1_4_rod_clearance_loose,
      loose=loose,
      length=length,
      cutter=cutter,
      center=center);
}

module 1_4_rod_collar(cutter=false) {
  rod(diameter=1_4_rod_collar_d,
      clearance=1_4_rod_collar_clearance,
      cutter=cutter,
      length=1_4_rod_collar_width);
}

module 5_16_rod(length=1, loose=false, cutter=false, center=false) {
  rod(diameter=5_16_rod_d,
      clearance=5_16_rod_clearance,
      clearance_loose=5_16_rod_clearance_loose,
      length=length,
      cutter=cutter,
      center=center);
}
// file: Vitamins/Grip.scad
function GripSlotAngle() = 30;
function GripWidth() = 0.85;
function GripExtensionX(extension, angle=GripSlotAngle()) = extension * sin(angle);
function GripExtensionZ(extension, angle=GripSlotAngle()) = extension * cos(angle);

module Grip_Bolt(od=0.255, lengthUp=1/4, lengthDown=2,
                 nut_od=0.5, nut_height=0.25, nut_angle=90) {

    color("Green", 0.5)
    %cube([.01,.01,.01], center=true);

    translate([0,0,0])
    rotate([0,30,0])
    union() {
      translate([0,0,-lengthDown])
      cylinder(r=od/2, h=lengthUp+lengthDown, $fn=20);

      // Nut
      rotate([0,0,nut_angle])
      translate([0,0,-0.125])
      cylinder(r=nut_od/2, h=nut_height, $fn=6);
    }
}

module GripTab(slot_width=0.35, slot_height=0.984, slot_length=1.28,
               slot_angle=30, slot_angle_offset = -0.4136, bolt_offset = 0.22,
               grip_width = 0.9,
               extension=1/8,
               extraFront=1/4, extraTop=0.2, debug=true) {
    translate([bolt_offset -GripExtensionX(extension, slot_angle),0,-GripExtensionZ(extension, slot_angle)]) {
    difference() {
      union() {

        // Mount body
        translate([-slot_length,-slot_width/2,-slot_height])
        color("Fuchsia")
        cube([slot_length,
              slot_width,
              slot_height+0.0001]);

        // Top
        intersection() {
          translate([-slot_length-0.25,-grip_width/2,-0.001])
          cube([slot_length+0.25+extraFront,grip_width,extraTop]);
          
          translate([-slot_length+0.25,-0.005,-0.05]) {
            translate([0,-(grip_width/2), 0])
            cube([slot_length,grip_width+0.01,extraTop+0.1]);
            
            cylinder(r=(grip_width/2)+0.01, h=extraTop+0.1, $fn=30);
          }
        }
        
        // Front
        translate([-0.0001,-grip_width/2,-slot_height-0.31])
        cube([extraFront,grip_width,slot_height+0.32]);
      }

      // Angle cutter
      translate([-slot_length,0,slot_angle_offset])
      rotate([0,slot_angle,0])
      translate([0,-slot_width/2 - 0.1,-1])
      cube([1.2, slot_width + 0.2, 1]);
    }

    // Grip
    color("CornflowerBlue")
    %if(debug)
    render(convexity=4)
    translate([-1.766,0])
    rotate([180,0,-90])
    scale([1/25.4, 1/25.4, 1/25.4])
    import("Grip.stl");
  }
}

module Grip(extension=1/8*sqrt(2), debug=false) {

  translate([0,0,0])
  difference() {
    translate([0,0,0])
    GripTab(extension=extension, debug=debug);

    // Mounting Hole Cutter
    translate([0,0,0])
    #Grip_Bolt(lengthDown=extension+5);
  }
}


// Test Print
scale([25.4,25.4,25.4]) {
  //translate([0,0,1/4])
  //rotate([0,90,0])
  Grip(extension=(1/8*sqrt(2)) + 1, debug=true);
}
// main file
//include <Components.scad>;
use <Vitamins/Grip.scad>;
use <Vitamins/Pipe.scad>;
use <Vitamins/Rod.scad>;
use <Forend Rail.scad>;
use <Trigger.scad>;
use <Reference.scad>;


module side_tee_housing(receiverTee=Spec_TeeThreeQuarterInch(), angles=[180, 50,-50],
                          wall = 3/16) {

  block_length = TeeWidth(receiverTee)
               - (TeeRimWidth(receiverTee)*2) - 0.03;

  translate([0,0,0])
  render(convexity=4)
  difference() {

    // Forend Rail
    translate([-block_length/2,0,0])
    rotate([0,90,0])
    linear_extrude(height=block_length)
    ForendRail(angles=angles, enableBottomInfill=false, wall=wall + 0.03);

    // Bottom Tee Rim
    TeeRim(receiverTee, height=TeeHeight(receiverTee));

    // Tee
    Tee(tee=receiverTee);
  }
}

scale([25.4, 25.4, 25.4]) {
  %Reference();

  translate([0,0,-TeeCenter(Spec_TeeThreeQuarterInch())])
  side_tee_housing();
}
